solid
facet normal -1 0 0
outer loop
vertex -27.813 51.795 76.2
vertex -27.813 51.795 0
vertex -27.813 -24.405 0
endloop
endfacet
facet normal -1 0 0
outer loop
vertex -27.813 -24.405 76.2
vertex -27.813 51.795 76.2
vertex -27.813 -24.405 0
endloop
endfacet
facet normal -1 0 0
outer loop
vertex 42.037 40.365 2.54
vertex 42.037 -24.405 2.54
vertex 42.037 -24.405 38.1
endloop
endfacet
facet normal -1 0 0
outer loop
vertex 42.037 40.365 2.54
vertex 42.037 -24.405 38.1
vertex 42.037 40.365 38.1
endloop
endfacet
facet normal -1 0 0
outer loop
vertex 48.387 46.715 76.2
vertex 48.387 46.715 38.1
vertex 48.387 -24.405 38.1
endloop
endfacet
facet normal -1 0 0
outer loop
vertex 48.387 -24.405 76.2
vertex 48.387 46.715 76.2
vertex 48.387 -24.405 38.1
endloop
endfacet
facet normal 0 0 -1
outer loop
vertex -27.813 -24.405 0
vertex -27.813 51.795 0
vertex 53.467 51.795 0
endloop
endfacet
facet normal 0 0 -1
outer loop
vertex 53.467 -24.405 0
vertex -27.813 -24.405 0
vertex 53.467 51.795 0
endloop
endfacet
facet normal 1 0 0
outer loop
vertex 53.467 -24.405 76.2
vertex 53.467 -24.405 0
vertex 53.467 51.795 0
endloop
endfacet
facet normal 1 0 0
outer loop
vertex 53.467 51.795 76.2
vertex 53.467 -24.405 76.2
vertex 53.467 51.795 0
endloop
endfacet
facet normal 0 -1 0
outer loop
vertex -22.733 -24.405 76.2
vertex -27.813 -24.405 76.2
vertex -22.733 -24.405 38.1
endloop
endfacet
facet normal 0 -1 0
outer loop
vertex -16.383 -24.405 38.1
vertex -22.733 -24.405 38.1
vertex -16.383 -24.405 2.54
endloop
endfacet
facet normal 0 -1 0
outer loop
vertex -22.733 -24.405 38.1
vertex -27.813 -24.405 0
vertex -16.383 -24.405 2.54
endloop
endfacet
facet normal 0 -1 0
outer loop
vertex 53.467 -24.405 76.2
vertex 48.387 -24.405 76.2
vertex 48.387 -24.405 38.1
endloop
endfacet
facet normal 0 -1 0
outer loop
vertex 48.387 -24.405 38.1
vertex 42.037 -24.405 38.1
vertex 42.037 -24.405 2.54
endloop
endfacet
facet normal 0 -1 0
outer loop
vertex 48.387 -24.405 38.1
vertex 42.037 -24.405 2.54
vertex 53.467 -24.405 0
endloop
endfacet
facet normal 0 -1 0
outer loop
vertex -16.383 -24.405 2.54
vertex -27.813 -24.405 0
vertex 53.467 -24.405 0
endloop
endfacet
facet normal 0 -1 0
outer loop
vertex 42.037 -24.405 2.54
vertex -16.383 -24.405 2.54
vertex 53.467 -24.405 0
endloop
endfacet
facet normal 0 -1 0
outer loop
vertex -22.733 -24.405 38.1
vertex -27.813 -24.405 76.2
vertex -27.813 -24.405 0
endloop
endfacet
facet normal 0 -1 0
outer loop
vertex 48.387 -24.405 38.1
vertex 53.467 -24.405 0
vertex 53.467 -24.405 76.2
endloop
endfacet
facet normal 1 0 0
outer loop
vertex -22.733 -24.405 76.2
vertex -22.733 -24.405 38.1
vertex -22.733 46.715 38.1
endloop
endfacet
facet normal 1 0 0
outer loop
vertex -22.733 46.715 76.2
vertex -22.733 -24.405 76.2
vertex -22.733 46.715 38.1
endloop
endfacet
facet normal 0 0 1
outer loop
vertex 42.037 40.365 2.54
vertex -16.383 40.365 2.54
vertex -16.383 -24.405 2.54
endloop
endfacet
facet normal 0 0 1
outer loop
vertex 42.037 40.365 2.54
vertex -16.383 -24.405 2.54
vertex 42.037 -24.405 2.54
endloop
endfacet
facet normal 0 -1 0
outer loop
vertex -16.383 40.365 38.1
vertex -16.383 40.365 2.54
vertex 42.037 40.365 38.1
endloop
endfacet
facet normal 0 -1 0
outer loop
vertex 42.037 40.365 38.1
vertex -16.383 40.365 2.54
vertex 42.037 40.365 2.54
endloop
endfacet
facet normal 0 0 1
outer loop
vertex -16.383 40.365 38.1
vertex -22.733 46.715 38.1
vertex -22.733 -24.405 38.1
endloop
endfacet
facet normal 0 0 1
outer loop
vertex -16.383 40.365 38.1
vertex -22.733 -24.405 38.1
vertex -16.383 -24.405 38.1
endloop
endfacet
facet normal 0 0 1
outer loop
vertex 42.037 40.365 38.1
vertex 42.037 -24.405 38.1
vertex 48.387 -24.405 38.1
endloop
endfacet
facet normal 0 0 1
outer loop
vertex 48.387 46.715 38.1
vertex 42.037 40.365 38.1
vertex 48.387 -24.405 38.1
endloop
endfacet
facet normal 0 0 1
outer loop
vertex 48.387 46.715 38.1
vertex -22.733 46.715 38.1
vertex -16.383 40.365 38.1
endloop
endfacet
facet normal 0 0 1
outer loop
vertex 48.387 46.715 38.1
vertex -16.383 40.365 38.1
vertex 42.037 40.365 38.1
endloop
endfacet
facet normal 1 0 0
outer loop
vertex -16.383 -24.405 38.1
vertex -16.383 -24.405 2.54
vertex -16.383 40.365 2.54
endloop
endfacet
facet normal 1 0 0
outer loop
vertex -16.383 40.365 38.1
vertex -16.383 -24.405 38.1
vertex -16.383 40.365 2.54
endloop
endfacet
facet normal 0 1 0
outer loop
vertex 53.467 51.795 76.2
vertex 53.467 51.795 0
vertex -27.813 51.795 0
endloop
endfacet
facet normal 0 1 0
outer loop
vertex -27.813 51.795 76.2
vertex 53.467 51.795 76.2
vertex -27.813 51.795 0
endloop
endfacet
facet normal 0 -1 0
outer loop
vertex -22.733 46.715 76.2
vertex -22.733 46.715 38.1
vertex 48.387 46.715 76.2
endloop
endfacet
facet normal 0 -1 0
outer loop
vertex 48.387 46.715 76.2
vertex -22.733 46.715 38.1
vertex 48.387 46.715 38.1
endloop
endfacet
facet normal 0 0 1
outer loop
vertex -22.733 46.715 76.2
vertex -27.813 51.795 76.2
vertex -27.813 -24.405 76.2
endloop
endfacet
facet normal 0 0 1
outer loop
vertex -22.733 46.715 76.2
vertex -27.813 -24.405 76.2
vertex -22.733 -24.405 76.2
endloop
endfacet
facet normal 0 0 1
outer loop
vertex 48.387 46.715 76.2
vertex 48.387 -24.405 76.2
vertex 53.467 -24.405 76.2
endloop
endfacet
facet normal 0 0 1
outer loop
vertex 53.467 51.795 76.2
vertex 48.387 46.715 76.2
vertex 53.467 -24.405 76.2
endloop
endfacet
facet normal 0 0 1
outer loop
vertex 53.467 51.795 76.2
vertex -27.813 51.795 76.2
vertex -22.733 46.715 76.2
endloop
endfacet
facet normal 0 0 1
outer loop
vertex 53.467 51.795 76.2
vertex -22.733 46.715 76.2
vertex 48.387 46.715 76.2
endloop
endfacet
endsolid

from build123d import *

# Parameters (mm, degrees)
F1_DEPTH = 76.2
F2_W     = 6.35
F2_H     = 71.12
F3_DEPTH = 38.1
F4_W     = 58.42
F4_H     = 71.12
F5_DEPTH = 2.54
F6_W     = 58.42
F6_H     = 6.35
F7_DEPTH = 38.1


with BuildPart() as f1:
    # F0 (on Top) → F1 (new body)
    with BuildSketch(Plane.XY):
        Polygon((-27.812527, 51.794526), (-27.812527, -24.405474), (-22.732527, -24.405474), (-22.732527, 46.714526), (48.387473, 46.714526), (48.387473, -24.405474), (53.467473, -24.405474), (53.467473, 51.794526), align=None)
    extrude(amount=F1_DEPTH)

    # F2 (on Top) → F3 (join)
    with BuildSketch(Plane.XY):
        with Locations((-19.557527, 11.154526)):
            Rectangle(F2_W, F2_H)
        with Locations((45.212473, 11.154526)):
            Rectangle(F2_W, F2_H)
    extrude(amount=F3_DEPTH)

    # F4 (on Top) → F5 (join)
    with BuildSketch(Plane.XY):
        with Locations((12.827473, 11.154526)):
            Rectangle(F4_W, F4_H)
    extrude(amount=F5_DEPTH)

    # F6 (on Top) → F7 (join)
    with BuildSketch(Plane.XY):
        with Locations((12.827473, 43.539526)):
            Rectangle(F6_W, F6_H)
    extrude(amount=F7_DEPTH)


solid = f1.part
